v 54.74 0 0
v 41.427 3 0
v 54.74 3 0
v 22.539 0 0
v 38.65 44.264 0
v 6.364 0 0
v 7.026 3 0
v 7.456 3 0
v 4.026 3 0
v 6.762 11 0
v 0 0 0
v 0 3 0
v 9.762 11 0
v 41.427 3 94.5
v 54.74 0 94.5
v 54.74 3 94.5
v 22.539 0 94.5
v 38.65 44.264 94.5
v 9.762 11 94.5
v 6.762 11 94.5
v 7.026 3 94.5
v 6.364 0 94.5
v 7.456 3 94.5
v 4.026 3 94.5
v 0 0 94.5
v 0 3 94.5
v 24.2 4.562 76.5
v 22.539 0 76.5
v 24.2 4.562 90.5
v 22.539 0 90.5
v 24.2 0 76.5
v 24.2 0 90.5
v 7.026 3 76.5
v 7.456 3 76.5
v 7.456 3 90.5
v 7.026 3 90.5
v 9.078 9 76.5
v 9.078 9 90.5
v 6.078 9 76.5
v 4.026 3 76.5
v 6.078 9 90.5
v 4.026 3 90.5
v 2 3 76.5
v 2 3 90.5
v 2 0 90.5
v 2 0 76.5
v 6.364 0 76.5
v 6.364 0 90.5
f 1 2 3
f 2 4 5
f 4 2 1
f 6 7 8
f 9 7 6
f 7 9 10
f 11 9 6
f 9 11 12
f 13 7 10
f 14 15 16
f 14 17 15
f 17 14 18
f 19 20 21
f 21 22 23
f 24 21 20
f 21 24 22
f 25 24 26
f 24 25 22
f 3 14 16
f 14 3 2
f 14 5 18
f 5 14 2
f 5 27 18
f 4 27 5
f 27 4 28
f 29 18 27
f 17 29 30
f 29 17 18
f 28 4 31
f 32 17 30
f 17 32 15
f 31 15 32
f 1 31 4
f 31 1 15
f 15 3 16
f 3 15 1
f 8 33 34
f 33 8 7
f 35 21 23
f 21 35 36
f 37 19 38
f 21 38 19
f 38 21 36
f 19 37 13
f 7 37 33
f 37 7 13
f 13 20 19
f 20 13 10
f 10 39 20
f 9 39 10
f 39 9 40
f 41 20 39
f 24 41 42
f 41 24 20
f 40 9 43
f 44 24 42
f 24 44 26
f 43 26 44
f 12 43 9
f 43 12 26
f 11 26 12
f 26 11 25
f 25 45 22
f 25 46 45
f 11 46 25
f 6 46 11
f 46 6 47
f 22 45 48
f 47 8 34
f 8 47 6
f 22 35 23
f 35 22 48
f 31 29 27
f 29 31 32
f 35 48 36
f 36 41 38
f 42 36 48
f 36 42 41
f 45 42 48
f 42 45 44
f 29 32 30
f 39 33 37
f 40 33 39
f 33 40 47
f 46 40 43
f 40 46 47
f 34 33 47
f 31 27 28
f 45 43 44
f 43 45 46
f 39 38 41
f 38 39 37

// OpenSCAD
/* Desk stand for the Waveshare ESP32-S3-Touch-LCD-4B ("Smart 86 Box").
 *
 * The board ships as a flush 86-type wall plate — 86.5 x 86.5 x 14 mm — which
 * is exactly the wrong shape to stand on a table. This is the missing piece:
 * a single-part wedge that holds it at a readable angle with the side-edge
 * USB-C cable running out of the way.
 *
 * ---------------------------------------------------------------------------
 * NOT PRINTED. NOT MEASURED ON THE REAL UNIT.
 *
 * Every dimension below comes from the datasheet figures recorded in
 * AGENTS.md §2, not from calipers on the device in hand, and no test print has
 * been made. Print the FIT TEST first (see `part` below): it is the slot and
 * the lip only, about four minutes of filament, and it will tell you whether
 * DEVICE_T and SLOT_CLEARANCE are right before you commit to an hour.
 * ---------------------------------------------------------------------------
 *
 * Why 20 degrees. The device is read at roughly 70 cm by someone seated, which
 * is the same viewing geometry DESIGN.md uses for its ISO 9241-303 character
 * height floor. Eye height above a table is around 35-40 cm, so the sight line
 * arrives about 25-30 degrees above horizontal; tipping the panel back 20 from
 * vertical puts the glass close to square to it without making the stand so
 * deep that it dominates the table. An LCD viewed off-axis loses contrast, and
 * contrast is the whole argument of the colour system.
 *
 * Units are millimetres. OpenSCAD: https://openscad.org (GPL-2.0).
 */

/* ---- what to render ---------------------------------------------------- */
// "stand"    the whole thing
// "fittest"  just the slot and lip, for checking the fit before a long print
part = "stand";

/* ---- the device -------------------------------------------------------- */
DEVICE_W = 86.5;   // AGENTS.md §2, faceplate width
DEVICE_H = 86.5;   // faceplate height
DEVICE_T = 14.0;   // faceplate depth. THE ONE TO VERIFY: the case may sit
                   // proud of this, and the slot is unforgiving if it does.

/* ---- the stand --------------------------------------------------------- */
TILT            = 20;   // degrees back from vertical
WALL            = 3.0;  // everything structural
SLOT_CLEARANCE  = 0.6;  // per side. 0.6 suits a 0.4 mm nozzle at 0.2 mm layers;
                        // raise it before you file anything down.
LIP_H           = 11;   // how far the front lip rises up the glass. Tall enough
                        // that a knock does not tip it out, short enough to
                        // clear the 480 px active area, which starts a few mm
                        // in from the faceplate edge.
BASE_MARGIN     = 6;    // base overhang in front of and behind the device, for
                        // the tipping moment
SIDE_EXTRA      = 4;    // base wider than the device, each side

CABLE_NOTCH_W   = 14;   // USB-C plug body plus a cheap boot
CABLE_NOTCH_H   = 9;
CABLE_SIDE      = 1;    // 1 = right as you look at the screen, -1 = left

$fn = 48;

/* ---- derived ----------------------------------------------------------- */
SLOT_T   = DEVICE_T + 2 * SLOT_CLEARANCE;
// Footprint the leaning device actually occupies, front face to back face.
LEAN_D   = DEVICE_T * cos(TILT) + DEVICE_H * sin(TILT);
BASE_D   = LEAN_D + 2 * BASE_MARGIN;
BASE_W   = DEVICE_W + 2 * SIDE_EXTRA;
// Back rest reaches ~55% up the device: enough to carry the lean, low enough
// that the body of the stand never enters the sight line.
BACK_H   = DEVICE_H * 0.55;

module side_profile() {
    // Drawn in X (depth) / Y (height), extruded across the width afterwards.
    difference() {
        union() {
            // Base slab.
            square([BASE_D, WALL]);
            // Back rest: a wedge leaning at TILT, thick at the bottom.
            translate([BASE_MARGIN + DEVICE_T * cos(TILT), 0])
                polygon([[0, 0],
                         [WALL * 2 + BACK_H * sin(TILT), 0],
                         [WALL * 2 + BACK_H * sin(TILT), WALL],
                         [BACK_H * sin(TILT) + WALL, BACK_H],
                         [BACK_H * sin(TILT), BACK_H]]);
            // Front lip.
            translate([BASE_MARGIN - WALL, 0])
                polygon([[0, 0],
                         [WALL, 0],
                         [WALL + LIP_H * sin(TILT), LIP_H],
                         [LIP_H * sin(TILT), LIP_H]]);
        }
        // The slot the device drops into — cut right through the base so a
        // grain of grit cannot hold the panel proud of its seat.
        translate([BASE_MARGIN, -1])
            rotate([0, 0, -TILT])
                translate([0, 1])
                    square([SLOT_T, DEVICE_H + 2]);
    }
}

module stand() {
    difference() {
        linear_extrude(height = BASE_W) side_profile();

        // Cable relief: a notch through the base and the front lip, on one
        // side, so a right-angle USB-C plug can leave sideways under the
        // glass instead of pushing the stand off the table.
        translate([BASE_MARGIN - WALL - 1,
                   -1,
                   CABLE_SIDE > 0 ? BASE_W - SIDE_EXTRA - CABLE_NOTCH_W
                                  : SIDE_EXTRA])
            cube([WALL + SLOT_T + 4, CABLE_NOTCH_H + 1, CABLE_NOTCH_W]);
    }
}

module fittest() {
    // 20 mm of the real thing, across the slot and the lip only.
    intersection() {
        stand();
        translate([-1, -1, (BASE_W - 20) / 2]) cube([BASE_D + 2, 60, 20]);
    }
}

if (part == "fittest") fittest(); else stand();

/* Printing, for whoever runs it:
 *
 *   As modelled, the part lies on its side — the flat face against the bed,
 *   the layers running across the width. That is the orientation you want:
 *   the load on the back rest is then a shear across layer lines rather than
 *   a peel along them, and nothing needs support.
 *
 *   PETG or PLA, 3 perimeters, 20% infill. PLA is fine indoors; it is not
 *   fine in a car in Pattaya in April.
 *
 *   Print `part = "fittest"` first.
 */
